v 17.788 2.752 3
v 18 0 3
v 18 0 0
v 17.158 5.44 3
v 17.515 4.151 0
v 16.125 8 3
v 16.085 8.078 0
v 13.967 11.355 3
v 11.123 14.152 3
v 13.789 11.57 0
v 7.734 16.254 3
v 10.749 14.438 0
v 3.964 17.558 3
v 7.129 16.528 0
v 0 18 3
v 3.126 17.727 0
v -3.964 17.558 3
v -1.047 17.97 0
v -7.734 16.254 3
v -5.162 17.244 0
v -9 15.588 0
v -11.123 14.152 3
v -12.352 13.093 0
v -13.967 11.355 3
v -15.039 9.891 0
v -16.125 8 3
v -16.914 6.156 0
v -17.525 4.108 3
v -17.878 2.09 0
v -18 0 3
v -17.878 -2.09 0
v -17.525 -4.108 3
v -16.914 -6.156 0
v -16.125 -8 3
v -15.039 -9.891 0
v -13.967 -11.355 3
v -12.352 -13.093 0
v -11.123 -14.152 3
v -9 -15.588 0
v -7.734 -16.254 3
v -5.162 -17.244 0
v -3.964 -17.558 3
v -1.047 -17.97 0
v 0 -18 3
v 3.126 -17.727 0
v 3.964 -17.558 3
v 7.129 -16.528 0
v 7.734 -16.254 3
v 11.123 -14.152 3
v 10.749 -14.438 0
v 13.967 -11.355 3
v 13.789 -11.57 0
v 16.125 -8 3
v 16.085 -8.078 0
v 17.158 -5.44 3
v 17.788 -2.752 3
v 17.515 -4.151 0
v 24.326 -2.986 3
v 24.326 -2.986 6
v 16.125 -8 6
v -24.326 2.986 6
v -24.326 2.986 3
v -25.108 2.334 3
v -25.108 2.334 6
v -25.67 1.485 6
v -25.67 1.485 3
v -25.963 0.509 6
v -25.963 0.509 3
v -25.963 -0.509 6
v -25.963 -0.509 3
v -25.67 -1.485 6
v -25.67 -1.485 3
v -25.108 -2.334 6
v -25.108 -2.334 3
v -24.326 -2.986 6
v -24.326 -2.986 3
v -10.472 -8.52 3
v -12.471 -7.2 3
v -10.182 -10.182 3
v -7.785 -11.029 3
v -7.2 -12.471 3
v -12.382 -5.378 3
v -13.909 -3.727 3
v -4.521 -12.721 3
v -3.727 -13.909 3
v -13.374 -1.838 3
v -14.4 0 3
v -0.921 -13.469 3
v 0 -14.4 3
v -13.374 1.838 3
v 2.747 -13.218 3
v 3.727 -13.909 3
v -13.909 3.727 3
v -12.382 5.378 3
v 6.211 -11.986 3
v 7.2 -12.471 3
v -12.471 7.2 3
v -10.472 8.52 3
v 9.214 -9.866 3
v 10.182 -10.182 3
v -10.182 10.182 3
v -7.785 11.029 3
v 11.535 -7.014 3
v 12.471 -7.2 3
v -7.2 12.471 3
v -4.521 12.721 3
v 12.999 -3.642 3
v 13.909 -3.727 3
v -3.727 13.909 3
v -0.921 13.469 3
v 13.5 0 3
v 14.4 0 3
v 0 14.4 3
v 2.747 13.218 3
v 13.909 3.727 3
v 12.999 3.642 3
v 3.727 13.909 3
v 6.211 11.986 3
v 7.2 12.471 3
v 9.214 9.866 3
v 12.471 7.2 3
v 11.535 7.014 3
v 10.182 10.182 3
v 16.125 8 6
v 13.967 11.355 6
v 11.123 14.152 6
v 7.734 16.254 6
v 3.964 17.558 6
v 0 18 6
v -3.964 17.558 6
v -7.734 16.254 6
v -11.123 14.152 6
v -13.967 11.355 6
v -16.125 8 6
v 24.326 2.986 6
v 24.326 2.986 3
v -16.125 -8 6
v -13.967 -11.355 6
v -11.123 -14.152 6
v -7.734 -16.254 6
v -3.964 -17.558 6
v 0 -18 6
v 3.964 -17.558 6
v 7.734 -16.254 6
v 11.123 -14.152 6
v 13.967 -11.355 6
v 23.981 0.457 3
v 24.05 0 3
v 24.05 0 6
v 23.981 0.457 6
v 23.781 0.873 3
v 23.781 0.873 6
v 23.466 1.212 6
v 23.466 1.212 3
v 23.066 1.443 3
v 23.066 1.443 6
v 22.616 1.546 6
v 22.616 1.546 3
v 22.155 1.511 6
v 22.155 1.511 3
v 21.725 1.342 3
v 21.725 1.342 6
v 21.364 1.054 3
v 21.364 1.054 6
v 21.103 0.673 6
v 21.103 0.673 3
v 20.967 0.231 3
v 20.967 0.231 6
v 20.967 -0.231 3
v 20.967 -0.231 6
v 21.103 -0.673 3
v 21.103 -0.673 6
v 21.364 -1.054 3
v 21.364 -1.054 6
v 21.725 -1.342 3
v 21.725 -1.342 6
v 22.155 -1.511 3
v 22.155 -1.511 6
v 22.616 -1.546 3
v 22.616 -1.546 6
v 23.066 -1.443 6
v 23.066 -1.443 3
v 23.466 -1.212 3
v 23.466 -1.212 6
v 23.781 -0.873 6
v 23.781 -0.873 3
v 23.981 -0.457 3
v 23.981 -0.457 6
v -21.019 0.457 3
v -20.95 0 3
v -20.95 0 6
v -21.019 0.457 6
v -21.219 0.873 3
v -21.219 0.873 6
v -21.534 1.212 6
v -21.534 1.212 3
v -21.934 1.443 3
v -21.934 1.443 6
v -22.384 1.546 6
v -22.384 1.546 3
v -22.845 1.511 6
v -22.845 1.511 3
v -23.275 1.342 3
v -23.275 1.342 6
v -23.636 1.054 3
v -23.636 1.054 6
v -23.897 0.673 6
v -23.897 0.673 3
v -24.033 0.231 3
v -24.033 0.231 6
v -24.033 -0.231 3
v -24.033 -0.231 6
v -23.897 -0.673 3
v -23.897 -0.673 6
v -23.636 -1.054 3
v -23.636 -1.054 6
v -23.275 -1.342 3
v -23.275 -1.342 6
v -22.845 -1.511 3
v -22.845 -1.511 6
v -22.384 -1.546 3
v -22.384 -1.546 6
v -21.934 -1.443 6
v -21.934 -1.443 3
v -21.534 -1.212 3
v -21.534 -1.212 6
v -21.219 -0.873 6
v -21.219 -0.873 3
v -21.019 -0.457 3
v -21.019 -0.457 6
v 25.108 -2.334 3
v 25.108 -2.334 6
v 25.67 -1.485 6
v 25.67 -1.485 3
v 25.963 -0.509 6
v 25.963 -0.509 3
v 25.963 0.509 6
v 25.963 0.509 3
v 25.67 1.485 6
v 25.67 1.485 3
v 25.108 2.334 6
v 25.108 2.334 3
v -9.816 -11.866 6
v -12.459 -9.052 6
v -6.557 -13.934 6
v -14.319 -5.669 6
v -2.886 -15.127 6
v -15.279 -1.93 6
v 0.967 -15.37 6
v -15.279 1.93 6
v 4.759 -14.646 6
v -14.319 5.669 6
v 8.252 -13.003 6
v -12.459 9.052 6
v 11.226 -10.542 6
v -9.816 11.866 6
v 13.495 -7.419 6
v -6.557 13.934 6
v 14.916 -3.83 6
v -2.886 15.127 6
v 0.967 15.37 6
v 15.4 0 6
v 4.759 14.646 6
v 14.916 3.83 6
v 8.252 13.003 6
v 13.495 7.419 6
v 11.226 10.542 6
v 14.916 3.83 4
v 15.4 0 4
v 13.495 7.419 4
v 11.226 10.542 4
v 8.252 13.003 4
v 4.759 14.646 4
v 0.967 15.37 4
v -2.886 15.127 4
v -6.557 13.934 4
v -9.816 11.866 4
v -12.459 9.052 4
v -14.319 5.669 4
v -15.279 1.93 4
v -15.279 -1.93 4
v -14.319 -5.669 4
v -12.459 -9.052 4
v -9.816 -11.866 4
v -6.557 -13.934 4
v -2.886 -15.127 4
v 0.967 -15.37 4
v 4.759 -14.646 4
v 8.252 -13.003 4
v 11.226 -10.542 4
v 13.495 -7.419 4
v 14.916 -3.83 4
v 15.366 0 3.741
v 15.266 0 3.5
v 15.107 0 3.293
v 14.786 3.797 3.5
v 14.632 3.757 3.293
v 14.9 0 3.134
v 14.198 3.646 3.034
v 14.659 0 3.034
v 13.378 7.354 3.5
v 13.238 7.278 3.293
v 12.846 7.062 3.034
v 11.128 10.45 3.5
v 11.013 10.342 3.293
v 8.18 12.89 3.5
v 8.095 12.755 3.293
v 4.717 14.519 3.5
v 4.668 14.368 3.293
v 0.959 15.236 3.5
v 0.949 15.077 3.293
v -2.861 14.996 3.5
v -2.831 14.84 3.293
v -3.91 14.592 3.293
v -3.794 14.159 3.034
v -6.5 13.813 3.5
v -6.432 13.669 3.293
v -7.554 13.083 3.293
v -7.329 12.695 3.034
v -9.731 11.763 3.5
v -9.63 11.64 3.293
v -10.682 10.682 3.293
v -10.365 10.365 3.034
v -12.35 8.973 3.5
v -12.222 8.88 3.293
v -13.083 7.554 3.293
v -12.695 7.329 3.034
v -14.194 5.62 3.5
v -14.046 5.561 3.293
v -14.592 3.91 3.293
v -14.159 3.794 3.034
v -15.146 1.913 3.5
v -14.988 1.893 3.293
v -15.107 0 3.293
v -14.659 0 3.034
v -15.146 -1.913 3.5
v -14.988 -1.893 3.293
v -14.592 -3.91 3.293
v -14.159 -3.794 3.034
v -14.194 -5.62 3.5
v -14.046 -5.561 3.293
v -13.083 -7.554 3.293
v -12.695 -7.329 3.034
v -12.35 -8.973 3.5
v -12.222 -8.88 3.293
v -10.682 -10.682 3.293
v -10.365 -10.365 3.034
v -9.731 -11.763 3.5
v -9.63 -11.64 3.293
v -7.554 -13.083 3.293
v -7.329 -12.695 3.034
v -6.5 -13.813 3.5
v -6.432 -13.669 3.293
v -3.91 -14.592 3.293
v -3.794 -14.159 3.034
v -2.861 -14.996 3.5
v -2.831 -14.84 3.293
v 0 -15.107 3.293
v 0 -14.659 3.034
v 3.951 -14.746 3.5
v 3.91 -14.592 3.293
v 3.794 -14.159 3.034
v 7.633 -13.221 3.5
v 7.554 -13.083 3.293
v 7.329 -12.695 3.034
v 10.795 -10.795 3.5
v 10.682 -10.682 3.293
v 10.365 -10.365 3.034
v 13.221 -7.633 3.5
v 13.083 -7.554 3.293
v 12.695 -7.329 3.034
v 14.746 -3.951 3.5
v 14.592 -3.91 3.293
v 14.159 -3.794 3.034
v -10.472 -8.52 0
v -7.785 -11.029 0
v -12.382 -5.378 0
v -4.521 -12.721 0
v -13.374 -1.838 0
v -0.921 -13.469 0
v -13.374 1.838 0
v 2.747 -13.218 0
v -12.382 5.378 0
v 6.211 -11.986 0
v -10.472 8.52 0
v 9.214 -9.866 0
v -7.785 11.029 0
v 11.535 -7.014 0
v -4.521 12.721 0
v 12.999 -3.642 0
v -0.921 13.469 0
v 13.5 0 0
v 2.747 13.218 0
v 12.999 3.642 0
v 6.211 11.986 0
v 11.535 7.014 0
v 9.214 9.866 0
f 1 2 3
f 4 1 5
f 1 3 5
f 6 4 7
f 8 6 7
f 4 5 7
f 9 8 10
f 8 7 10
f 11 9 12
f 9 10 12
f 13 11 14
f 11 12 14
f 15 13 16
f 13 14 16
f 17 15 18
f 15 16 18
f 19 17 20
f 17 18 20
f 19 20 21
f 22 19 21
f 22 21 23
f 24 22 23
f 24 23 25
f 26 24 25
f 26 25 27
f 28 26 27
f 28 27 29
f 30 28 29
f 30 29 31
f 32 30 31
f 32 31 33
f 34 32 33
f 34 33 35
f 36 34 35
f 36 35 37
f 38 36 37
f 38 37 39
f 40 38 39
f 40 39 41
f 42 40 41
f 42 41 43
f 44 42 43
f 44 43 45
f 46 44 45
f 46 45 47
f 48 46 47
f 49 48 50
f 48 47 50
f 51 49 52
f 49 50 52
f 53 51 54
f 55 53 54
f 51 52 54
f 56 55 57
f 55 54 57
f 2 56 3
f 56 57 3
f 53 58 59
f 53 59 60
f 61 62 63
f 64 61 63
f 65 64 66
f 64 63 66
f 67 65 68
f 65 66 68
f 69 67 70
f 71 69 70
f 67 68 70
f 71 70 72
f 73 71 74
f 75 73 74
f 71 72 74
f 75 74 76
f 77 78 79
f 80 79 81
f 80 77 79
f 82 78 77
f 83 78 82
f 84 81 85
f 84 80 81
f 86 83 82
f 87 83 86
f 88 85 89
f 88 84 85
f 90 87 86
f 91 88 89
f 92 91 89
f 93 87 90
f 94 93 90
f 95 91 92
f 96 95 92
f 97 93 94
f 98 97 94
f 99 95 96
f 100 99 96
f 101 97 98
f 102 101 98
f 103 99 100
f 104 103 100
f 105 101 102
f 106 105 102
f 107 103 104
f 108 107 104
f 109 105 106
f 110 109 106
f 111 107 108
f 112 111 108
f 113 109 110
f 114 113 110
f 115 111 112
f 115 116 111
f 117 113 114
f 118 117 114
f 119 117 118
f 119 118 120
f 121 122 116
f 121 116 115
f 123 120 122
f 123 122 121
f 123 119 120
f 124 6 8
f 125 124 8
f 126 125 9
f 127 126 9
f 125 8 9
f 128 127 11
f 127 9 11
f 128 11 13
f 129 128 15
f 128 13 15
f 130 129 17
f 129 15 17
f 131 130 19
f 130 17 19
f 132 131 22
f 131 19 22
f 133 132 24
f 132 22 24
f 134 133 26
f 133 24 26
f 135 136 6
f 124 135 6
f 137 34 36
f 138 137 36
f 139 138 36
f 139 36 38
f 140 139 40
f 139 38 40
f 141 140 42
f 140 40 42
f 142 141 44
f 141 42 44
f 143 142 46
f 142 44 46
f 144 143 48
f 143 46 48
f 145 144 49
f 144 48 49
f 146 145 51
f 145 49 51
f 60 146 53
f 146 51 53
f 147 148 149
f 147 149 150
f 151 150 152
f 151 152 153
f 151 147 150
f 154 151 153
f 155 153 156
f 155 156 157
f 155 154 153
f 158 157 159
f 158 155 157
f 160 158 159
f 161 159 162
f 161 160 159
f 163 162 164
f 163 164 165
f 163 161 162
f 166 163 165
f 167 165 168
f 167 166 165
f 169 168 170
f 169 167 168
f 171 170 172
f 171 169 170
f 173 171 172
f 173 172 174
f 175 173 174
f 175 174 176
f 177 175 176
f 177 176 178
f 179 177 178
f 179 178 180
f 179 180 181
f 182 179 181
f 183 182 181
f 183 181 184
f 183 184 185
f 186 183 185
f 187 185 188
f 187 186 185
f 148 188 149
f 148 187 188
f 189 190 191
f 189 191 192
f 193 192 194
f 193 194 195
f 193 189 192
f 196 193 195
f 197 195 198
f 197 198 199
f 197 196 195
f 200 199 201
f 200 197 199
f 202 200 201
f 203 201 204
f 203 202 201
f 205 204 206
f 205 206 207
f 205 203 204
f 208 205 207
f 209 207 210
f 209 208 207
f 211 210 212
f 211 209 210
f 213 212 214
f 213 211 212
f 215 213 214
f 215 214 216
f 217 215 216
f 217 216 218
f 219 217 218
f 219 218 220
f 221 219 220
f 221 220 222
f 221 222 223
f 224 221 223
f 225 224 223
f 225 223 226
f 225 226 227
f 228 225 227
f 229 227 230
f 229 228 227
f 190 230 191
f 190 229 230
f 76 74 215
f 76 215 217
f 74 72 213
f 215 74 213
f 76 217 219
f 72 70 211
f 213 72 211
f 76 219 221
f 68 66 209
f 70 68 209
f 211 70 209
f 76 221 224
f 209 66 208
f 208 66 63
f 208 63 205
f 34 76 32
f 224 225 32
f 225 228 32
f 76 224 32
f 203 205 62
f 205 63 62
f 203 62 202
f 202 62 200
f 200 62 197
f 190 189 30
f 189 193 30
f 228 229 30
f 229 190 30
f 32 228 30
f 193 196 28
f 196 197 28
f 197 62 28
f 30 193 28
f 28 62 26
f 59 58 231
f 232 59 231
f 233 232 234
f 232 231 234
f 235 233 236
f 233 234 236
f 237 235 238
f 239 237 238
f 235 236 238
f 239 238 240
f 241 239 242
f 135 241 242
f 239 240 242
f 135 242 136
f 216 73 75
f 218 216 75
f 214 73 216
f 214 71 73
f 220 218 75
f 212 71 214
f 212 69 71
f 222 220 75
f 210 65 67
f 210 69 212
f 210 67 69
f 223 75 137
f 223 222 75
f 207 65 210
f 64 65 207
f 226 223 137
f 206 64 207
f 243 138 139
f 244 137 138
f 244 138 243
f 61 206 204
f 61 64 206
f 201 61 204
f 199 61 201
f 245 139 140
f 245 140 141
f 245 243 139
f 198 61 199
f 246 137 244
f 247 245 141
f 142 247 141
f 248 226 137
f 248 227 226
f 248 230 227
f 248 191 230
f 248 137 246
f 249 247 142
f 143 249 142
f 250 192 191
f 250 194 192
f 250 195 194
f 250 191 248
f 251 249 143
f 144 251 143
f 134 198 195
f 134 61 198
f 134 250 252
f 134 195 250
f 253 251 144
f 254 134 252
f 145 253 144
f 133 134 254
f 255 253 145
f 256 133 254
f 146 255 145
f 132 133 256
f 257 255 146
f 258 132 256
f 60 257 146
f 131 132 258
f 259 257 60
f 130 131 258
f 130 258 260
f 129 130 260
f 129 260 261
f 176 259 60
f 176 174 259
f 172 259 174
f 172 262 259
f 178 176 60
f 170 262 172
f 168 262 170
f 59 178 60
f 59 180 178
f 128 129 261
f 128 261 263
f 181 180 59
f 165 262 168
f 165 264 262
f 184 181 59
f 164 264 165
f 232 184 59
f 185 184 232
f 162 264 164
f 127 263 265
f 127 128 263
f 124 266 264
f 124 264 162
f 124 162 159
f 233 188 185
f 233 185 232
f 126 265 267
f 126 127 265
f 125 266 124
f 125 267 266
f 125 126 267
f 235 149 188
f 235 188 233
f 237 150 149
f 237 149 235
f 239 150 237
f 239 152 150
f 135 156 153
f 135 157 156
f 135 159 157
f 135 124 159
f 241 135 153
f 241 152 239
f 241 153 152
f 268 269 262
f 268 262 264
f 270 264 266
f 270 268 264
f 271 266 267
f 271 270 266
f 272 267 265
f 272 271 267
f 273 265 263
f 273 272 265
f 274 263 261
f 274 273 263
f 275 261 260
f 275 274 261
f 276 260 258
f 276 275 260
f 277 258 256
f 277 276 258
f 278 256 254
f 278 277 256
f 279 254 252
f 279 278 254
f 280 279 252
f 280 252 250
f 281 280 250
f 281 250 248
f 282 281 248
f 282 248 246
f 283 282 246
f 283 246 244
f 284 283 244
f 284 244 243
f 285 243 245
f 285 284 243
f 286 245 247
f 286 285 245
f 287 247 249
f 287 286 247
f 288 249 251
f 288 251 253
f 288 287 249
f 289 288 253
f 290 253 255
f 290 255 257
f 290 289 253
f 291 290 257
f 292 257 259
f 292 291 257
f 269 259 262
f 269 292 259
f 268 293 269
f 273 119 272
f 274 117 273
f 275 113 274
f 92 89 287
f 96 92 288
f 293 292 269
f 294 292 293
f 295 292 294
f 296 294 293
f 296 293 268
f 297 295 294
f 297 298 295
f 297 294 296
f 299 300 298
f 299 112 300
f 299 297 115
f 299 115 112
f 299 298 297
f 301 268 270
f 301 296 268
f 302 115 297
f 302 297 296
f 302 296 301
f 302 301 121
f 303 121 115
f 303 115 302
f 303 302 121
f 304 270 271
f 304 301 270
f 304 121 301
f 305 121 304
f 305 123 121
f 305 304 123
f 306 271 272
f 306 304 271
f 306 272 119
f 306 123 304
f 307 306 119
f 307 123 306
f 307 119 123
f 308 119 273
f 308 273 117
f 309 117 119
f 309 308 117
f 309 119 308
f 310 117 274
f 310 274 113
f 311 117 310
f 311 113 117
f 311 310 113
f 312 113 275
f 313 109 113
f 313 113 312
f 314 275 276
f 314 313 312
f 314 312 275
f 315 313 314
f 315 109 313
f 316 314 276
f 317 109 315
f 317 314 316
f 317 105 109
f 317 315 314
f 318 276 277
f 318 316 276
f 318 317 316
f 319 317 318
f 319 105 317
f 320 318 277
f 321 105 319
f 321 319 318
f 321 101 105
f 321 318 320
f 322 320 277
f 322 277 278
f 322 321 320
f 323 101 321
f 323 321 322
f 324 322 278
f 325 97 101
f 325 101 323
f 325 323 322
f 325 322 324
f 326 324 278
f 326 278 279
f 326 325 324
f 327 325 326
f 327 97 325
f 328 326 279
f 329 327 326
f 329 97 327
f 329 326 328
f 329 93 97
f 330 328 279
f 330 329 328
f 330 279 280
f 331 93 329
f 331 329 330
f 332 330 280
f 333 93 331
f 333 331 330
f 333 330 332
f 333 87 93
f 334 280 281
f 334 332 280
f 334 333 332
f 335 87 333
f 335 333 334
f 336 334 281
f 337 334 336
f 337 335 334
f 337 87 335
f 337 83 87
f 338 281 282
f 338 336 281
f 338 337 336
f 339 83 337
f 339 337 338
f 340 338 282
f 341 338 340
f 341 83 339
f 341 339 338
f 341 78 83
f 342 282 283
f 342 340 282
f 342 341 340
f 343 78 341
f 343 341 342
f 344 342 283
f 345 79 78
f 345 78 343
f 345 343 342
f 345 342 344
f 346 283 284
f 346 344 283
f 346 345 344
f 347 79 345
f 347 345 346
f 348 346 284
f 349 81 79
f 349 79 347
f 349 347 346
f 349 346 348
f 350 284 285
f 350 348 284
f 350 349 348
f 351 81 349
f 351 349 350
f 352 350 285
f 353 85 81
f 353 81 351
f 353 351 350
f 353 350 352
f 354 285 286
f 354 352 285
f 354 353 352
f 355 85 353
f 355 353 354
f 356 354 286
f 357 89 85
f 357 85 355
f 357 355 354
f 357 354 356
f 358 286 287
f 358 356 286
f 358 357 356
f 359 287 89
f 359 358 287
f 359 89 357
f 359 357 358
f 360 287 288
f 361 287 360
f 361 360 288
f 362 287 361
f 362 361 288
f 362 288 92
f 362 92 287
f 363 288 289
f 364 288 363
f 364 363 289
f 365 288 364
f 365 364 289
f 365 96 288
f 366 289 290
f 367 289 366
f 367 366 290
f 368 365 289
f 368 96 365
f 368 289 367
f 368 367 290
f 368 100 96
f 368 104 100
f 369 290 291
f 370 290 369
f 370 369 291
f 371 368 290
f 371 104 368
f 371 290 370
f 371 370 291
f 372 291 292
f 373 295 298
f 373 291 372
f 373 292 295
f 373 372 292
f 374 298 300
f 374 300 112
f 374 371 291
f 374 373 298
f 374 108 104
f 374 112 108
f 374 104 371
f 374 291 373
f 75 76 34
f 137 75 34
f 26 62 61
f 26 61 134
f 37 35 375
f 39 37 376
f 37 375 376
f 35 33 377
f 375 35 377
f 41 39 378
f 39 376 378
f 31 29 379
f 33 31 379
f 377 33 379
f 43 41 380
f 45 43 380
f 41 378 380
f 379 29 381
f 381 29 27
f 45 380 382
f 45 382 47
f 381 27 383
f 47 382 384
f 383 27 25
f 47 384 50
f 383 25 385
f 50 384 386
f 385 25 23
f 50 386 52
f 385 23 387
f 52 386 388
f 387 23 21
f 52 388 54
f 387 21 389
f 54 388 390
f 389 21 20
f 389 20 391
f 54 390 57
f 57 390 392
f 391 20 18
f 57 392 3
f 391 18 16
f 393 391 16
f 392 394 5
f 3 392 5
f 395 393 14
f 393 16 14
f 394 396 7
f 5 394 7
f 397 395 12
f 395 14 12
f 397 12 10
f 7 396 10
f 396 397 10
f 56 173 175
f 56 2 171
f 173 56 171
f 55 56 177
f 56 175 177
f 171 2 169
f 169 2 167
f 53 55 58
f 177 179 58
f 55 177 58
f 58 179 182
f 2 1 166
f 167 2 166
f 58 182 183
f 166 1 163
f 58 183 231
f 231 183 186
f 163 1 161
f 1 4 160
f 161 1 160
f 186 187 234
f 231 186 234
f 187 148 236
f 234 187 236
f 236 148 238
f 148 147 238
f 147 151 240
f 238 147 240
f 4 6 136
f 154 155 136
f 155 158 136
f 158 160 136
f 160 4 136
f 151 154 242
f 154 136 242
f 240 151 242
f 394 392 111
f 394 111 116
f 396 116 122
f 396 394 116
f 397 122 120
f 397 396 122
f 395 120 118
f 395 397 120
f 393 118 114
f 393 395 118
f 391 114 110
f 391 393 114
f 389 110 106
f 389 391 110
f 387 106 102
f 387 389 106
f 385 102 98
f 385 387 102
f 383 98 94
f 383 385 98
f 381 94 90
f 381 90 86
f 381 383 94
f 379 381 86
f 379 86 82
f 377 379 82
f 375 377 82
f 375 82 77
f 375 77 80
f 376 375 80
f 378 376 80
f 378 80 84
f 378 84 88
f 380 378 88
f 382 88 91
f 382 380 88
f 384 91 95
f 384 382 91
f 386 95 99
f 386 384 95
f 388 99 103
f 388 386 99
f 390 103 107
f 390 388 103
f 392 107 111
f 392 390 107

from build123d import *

# Parameters (mm, degrees)
SKETCH_R      = 18
SKETCH_R_2    = 13.5
PAD_DEPTH     = 3
SKETCH001_R   = 15.4
SKETCH001_R_2 = 1.55
PAD001_DEPTH  = 3
FILLET_R      = 1


with BuildPart() as part:
    # Sketch → Pad (new body)
    with BuildSketch(Plane.XY):
        Circle(SKETCH_R)
        Circle(SKETCH_R_2, mode=Mode.SUBTRACT)
    extrude(amount=PAD_DEPTH)

    # Sketch001 (on Face4 of Pad) → Pad001 (join)
    with BuildSketch(Plane.XY.offset(3)):
        with BuildLine():
            ThreePointArc((-16.124515, -8), (0, -18), (16.124515, -8))
            Line((24.325621, -2.986153), (16.124515, -8))
            ThreePointArc((24.325621, -2.986153), (26, 0), (24.325621, 2.986153))
            Line((24.325621, 2.986153), (16.124515, 8))
            ThreePointArc((16.124515, 8), (0, 18), (-16.124515, 8))
            Line((-24.325621, 2.986153), (-16.124515, 8))
            ThreePointArc((-24.325621, 2.986153), (-26, 0), (-24.325621, -2.986153))
            Line((-24.325621, -2.986153), (-16.124515, -8))
        make_face()
        Circle(SKETCH001_R, mode=Mode.SUBTRACT)
        with Locations((-22.5, 0)):
            Circle(SKETCH001_R_2, mode=Mode.SUBTRACT)
        with Locations((22.5, 0)):
            Circle(SKETCH001_R_2, mode=Mode.SUBTRACT)
    extrude(amount=PAD001_DEPTH)

    # Fillet
    fillet_edges = [part.edges().sort_by_distance(p)[0] for p in [
        (-15.4, 0, 3),
    ]]
    fillet(fillet_edges, radius=FILLET_R)


solid = part.part
